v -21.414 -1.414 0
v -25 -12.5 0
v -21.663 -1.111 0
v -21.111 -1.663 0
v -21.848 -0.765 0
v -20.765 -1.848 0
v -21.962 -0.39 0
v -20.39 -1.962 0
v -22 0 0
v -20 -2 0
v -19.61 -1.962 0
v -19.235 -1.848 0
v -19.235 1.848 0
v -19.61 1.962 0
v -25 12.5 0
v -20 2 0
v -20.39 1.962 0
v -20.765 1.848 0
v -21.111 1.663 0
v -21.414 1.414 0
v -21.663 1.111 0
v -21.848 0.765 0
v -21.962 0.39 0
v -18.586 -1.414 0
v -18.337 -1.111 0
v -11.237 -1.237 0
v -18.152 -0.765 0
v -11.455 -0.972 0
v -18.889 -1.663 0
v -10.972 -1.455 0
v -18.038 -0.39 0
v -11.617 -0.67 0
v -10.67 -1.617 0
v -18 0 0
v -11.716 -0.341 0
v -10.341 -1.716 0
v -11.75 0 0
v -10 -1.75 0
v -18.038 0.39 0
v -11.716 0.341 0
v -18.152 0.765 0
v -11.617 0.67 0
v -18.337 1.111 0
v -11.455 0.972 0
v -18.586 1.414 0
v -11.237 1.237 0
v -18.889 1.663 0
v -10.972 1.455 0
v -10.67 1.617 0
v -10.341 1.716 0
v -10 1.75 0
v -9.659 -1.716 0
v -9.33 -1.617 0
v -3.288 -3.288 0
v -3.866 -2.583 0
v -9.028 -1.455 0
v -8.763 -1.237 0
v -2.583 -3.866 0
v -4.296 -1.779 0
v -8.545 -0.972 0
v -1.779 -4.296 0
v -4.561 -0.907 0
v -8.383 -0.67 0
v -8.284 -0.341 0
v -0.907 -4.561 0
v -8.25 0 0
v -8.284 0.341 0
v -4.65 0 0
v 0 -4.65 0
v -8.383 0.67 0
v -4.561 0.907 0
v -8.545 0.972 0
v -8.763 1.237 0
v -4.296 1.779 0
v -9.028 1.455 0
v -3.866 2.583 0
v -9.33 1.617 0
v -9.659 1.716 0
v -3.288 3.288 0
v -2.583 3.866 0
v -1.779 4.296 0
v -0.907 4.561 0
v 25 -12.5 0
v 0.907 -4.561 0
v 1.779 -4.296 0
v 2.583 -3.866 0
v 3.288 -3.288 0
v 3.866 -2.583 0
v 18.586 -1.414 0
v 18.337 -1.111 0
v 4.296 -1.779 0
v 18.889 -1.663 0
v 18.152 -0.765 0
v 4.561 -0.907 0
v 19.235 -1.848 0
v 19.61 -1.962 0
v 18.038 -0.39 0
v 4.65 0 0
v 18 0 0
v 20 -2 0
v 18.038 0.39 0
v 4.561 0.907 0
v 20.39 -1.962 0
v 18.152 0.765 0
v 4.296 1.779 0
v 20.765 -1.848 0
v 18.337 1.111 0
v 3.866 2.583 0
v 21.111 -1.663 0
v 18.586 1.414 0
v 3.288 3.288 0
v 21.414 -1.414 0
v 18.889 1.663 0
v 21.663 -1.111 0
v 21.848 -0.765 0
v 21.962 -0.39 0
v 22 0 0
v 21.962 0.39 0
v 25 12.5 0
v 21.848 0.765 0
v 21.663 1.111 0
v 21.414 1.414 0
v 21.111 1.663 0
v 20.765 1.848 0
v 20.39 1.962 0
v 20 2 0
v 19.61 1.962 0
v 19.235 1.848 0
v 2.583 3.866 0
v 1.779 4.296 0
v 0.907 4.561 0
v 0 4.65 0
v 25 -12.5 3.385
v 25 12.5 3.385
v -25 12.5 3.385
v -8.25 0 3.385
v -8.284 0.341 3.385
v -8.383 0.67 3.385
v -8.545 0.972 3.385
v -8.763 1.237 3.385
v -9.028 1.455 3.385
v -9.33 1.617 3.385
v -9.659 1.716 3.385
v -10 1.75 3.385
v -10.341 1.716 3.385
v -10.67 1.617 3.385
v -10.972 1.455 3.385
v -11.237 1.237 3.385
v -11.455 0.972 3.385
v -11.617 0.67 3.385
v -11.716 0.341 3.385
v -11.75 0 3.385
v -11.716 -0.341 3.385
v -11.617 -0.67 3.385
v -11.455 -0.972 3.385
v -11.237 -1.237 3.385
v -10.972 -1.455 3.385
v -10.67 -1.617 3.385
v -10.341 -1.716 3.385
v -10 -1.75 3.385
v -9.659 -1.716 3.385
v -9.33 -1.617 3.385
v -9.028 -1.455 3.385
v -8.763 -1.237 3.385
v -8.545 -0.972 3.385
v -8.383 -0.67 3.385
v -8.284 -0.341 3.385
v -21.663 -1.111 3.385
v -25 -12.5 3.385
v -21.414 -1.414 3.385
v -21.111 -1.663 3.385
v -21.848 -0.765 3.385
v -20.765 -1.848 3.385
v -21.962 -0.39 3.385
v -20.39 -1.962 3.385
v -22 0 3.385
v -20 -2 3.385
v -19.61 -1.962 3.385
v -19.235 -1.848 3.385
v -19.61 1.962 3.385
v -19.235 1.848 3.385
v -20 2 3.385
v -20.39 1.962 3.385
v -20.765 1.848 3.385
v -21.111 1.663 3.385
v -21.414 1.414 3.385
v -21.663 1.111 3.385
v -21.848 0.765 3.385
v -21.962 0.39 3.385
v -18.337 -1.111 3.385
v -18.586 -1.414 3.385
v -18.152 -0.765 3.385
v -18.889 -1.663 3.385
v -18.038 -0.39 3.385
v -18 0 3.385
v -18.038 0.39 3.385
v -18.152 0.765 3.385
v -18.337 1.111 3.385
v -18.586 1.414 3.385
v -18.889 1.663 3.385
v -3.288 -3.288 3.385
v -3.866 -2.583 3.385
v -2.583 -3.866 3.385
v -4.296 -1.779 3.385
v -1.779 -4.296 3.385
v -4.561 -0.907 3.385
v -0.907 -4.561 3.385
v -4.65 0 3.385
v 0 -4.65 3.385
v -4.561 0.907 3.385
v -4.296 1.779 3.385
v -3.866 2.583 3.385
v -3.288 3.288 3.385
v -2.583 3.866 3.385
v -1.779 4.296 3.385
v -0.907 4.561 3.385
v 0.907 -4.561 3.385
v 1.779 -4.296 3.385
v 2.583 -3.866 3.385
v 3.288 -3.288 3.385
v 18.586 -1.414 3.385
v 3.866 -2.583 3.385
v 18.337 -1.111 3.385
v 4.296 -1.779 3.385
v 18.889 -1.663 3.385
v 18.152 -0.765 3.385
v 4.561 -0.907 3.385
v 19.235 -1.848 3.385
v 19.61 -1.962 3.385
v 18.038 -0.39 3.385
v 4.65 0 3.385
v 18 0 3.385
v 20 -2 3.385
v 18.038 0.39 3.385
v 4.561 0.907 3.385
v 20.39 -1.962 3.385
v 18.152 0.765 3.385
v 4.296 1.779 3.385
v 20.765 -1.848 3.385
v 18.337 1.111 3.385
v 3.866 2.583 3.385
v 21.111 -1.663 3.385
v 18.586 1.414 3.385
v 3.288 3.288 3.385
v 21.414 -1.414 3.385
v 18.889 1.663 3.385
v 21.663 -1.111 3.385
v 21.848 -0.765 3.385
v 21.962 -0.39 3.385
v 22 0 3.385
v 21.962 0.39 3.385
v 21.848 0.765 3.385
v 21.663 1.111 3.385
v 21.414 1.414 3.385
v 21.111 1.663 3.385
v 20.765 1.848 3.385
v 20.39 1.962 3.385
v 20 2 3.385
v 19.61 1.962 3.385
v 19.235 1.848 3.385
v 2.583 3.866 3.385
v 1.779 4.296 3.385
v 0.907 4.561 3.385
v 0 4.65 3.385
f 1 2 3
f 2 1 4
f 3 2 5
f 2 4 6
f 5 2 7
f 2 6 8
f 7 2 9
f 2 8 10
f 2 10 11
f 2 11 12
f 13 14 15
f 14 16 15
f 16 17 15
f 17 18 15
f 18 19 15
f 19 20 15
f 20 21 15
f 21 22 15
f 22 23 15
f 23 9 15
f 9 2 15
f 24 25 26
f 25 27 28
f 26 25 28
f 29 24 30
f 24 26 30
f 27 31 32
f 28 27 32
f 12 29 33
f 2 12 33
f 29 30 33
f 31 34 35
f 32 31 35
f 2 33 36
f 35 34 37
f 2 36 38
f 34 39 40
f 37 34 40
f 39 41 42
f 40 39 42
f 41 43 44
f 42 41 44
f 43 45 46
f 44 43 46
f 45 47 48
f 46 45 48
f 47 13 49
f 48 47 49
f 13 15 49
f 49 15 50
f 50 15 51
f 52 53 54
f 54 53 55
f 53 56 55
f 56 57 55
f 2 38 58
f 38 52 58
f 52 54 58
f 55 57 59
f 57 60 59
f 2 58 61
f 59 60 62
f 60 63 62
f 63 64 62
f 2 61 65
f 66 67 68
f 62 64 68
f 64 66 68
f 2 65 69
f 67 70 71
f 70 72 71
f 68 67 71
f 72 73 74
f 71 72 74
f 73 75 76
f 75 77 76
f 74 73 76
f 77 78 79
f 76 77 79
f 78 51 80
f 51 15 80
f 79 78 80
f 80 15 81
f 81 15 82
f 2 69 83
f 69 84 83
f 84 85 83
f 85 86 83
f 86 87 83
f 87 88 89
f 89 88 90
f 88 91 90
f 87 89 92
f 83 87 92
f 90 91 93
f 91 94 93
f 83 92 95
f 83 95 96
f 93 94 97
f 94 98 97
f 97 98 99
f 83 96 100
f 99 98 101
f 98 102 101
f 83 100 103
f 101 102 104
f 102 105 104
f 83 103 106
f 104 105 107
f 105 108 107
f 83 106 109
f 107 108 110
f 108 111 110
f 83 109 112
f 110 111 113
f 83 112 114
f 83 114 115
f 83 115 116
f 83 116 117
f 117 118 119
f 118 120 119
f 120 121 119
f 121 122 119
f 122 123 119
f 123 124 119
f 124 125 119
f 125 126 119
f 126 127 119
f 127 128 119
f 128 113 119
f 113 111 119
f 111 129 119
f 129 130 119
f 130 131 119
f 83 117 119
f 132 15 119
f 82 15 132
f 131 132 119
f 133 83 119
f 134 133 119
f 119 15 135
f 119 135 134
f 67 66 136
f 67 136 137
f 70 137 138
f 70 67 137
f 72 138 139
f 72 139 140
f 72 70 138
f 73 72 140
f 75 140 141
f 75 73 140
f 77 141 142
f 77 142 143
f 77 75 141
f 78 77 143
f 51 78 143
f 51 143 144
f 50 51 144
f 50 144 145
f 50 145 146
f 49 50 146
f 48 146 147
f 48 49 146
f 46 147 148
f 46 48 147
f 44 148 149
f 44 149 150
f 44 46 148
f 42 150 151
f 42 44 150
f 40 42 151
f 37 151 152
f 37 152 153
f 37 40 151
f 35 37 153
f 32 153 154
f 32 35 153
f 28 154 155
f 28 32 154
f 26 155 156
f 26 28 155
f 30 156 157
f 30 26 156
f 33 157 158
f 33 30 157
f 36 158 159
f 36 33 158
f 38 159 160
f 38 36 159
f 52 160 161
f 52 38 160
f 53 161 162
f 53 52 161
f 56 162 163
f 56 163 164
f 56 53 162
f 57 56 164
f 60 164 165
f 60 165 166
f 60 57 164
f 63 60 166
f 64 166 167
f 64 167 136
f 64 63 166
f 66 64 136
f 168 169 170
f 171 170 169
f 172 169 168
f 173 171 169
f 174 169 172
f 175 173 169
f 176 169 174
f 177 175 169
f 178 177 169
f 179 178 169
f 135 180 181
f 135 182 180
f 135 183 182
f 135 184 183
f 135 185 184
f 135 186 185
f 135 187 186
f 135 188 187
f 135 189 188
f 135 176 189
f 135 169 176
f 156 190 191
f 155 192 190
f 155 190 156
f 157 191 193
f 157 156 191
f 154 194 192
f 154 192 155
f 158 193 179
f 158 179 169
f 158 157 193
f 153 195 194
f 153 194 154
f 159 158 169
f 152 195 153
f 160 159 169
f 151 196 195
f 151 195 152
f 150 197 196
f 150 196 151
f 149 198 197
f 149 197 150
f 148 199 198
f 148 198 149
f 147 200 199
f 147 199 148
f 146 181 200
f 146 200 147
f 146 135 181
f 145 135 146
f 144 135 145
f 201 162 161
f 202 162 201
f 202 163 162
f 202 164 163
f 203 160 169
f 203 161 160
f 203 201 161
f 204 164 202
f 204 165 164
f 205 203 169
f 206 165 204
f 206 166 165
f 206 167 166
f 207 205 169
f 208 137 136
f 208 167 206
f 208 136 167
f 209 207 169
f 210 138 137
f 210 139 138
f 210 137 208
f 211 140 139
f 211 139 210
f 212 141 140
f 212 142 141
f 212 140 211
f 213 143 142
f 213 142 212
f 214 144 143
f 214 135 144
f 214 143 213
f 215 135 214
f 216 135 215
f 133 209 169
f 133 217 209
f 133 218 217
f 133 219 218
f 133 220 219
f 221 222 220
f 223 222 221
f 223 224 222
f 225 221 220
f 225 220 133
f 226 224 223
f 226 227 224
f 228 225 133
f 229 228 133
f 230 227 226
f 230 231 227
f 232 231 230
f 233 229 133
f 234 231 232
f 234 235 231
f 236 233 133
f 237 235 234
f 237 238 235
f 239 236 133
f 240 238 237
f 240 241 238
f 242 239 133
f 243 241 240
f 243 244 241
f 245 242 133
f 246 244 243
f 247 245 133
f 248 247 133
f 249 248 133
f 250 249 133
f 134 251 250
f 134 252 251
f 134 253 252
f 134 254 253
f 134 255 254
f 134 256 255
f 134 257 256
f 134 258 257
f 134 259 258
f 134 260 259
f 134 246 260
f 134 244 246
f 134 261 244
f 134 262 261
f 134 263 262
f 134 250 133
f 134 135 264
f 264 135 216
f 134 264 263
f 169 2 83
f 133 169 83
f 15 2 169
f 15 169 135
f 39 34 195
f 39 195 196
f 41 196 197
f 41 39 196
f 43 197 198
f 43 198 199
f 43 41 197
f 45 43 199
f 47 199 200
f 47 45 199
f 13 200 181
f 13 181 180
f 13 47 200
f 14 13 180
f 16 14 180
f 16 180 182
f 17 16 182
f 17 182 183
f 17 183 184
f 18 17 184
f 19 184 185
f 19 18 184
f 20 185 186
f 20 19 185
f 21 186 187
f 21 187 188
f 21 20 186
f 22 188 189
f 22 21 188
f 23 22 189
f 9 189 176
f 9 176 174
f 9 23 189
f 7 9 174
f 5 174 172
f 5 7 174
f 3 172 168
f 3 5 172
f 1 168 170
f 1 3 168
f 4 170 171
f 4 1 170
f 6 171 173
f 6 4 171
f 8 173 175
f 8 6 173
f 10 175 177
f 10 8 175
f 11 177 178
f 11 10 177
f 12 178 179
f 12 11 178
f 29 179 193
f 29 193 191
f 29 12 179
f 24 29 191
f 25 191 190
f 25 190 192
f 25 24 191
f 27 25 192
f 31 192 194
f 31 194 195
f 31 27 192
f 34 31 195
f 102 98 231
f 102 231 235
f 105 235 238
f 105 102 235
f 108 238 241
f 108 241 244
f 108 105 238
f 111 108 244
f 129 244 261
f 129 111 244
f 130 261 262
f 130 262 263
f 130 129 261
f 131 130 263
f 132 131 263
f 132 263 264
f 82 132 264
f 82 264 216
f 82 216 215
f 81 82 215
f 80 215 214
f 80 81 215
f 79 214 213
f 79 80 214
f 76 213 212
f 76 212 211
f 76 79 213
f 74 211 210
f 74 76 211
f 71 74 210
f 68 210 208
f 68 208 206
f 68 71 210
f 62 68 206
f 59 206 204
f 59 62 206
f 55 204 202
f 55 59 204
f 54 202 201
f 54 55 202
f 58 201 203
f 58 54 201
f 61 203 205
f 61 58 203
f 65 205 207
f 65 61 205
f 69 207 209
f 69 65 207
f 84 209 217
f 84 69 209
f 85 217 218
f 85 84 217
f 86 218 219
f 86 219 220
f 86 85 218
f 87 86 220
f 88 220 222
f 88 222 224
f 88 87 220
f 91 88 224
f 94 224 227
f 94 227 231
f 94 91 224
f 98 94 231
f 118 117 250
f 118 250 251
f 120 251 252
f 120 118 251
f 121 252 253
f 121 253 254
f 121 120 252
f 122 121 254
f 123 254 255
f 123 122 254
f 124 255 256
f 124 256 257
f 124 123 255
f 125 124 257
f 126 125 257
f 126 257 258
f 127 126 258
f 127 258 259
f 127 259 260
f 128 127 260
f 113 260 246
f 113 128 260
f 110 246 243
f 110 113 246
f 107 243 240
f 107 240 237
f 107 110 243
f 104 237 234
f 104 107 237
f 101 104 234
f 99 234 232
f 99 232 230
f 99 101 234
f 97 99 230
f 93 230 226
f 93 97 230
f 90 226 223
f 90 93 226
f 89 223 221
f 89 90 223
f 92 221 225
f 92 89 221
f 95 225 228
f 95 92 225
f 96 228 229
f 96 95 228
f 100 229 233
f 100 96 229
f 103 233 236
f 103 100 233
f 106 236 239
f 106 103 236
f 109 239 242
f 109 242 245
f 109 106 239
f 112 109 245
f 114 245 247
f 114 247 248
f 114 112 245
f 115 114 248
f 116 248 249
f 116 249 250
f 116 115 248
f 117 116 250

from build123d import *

# Parameters (mm, degrees)
SKETCH1_W           = 50
SKETCH1_H           = 25
SKETCH1_R           = 4.65
SKETCH1_R_2         = 1.75
SKETCH1_R_3         = 2
BOSS_EXTRUDE1_DEPTH = 3.385


with BuildPart() as part:
    # Sketch1 → Boss-Extrude1 (new body)
    with BuildSketch(Plane.XY):
        Rectangle(SKETCH1_W, SKETCH1_H)
        Circle(SKETCH1_R, mode=Mode.SUBTRACT)
        with Locations((-10, 0)):
            Circle(SKETCH1_R_2, mode=Mode.SUBTRACT)
        with Locations((20, 0)):
            Circle(SKETCH1_R_3, mode=Mode.SUBTRACT)
        with Locations((-20, 0)):
            Circle(SKETCH1_R_3, mode=Mode.SUBTRACT)
    extrude(amount=BOSS_EXTRUDE1_DEPTH)


solid = part.part
